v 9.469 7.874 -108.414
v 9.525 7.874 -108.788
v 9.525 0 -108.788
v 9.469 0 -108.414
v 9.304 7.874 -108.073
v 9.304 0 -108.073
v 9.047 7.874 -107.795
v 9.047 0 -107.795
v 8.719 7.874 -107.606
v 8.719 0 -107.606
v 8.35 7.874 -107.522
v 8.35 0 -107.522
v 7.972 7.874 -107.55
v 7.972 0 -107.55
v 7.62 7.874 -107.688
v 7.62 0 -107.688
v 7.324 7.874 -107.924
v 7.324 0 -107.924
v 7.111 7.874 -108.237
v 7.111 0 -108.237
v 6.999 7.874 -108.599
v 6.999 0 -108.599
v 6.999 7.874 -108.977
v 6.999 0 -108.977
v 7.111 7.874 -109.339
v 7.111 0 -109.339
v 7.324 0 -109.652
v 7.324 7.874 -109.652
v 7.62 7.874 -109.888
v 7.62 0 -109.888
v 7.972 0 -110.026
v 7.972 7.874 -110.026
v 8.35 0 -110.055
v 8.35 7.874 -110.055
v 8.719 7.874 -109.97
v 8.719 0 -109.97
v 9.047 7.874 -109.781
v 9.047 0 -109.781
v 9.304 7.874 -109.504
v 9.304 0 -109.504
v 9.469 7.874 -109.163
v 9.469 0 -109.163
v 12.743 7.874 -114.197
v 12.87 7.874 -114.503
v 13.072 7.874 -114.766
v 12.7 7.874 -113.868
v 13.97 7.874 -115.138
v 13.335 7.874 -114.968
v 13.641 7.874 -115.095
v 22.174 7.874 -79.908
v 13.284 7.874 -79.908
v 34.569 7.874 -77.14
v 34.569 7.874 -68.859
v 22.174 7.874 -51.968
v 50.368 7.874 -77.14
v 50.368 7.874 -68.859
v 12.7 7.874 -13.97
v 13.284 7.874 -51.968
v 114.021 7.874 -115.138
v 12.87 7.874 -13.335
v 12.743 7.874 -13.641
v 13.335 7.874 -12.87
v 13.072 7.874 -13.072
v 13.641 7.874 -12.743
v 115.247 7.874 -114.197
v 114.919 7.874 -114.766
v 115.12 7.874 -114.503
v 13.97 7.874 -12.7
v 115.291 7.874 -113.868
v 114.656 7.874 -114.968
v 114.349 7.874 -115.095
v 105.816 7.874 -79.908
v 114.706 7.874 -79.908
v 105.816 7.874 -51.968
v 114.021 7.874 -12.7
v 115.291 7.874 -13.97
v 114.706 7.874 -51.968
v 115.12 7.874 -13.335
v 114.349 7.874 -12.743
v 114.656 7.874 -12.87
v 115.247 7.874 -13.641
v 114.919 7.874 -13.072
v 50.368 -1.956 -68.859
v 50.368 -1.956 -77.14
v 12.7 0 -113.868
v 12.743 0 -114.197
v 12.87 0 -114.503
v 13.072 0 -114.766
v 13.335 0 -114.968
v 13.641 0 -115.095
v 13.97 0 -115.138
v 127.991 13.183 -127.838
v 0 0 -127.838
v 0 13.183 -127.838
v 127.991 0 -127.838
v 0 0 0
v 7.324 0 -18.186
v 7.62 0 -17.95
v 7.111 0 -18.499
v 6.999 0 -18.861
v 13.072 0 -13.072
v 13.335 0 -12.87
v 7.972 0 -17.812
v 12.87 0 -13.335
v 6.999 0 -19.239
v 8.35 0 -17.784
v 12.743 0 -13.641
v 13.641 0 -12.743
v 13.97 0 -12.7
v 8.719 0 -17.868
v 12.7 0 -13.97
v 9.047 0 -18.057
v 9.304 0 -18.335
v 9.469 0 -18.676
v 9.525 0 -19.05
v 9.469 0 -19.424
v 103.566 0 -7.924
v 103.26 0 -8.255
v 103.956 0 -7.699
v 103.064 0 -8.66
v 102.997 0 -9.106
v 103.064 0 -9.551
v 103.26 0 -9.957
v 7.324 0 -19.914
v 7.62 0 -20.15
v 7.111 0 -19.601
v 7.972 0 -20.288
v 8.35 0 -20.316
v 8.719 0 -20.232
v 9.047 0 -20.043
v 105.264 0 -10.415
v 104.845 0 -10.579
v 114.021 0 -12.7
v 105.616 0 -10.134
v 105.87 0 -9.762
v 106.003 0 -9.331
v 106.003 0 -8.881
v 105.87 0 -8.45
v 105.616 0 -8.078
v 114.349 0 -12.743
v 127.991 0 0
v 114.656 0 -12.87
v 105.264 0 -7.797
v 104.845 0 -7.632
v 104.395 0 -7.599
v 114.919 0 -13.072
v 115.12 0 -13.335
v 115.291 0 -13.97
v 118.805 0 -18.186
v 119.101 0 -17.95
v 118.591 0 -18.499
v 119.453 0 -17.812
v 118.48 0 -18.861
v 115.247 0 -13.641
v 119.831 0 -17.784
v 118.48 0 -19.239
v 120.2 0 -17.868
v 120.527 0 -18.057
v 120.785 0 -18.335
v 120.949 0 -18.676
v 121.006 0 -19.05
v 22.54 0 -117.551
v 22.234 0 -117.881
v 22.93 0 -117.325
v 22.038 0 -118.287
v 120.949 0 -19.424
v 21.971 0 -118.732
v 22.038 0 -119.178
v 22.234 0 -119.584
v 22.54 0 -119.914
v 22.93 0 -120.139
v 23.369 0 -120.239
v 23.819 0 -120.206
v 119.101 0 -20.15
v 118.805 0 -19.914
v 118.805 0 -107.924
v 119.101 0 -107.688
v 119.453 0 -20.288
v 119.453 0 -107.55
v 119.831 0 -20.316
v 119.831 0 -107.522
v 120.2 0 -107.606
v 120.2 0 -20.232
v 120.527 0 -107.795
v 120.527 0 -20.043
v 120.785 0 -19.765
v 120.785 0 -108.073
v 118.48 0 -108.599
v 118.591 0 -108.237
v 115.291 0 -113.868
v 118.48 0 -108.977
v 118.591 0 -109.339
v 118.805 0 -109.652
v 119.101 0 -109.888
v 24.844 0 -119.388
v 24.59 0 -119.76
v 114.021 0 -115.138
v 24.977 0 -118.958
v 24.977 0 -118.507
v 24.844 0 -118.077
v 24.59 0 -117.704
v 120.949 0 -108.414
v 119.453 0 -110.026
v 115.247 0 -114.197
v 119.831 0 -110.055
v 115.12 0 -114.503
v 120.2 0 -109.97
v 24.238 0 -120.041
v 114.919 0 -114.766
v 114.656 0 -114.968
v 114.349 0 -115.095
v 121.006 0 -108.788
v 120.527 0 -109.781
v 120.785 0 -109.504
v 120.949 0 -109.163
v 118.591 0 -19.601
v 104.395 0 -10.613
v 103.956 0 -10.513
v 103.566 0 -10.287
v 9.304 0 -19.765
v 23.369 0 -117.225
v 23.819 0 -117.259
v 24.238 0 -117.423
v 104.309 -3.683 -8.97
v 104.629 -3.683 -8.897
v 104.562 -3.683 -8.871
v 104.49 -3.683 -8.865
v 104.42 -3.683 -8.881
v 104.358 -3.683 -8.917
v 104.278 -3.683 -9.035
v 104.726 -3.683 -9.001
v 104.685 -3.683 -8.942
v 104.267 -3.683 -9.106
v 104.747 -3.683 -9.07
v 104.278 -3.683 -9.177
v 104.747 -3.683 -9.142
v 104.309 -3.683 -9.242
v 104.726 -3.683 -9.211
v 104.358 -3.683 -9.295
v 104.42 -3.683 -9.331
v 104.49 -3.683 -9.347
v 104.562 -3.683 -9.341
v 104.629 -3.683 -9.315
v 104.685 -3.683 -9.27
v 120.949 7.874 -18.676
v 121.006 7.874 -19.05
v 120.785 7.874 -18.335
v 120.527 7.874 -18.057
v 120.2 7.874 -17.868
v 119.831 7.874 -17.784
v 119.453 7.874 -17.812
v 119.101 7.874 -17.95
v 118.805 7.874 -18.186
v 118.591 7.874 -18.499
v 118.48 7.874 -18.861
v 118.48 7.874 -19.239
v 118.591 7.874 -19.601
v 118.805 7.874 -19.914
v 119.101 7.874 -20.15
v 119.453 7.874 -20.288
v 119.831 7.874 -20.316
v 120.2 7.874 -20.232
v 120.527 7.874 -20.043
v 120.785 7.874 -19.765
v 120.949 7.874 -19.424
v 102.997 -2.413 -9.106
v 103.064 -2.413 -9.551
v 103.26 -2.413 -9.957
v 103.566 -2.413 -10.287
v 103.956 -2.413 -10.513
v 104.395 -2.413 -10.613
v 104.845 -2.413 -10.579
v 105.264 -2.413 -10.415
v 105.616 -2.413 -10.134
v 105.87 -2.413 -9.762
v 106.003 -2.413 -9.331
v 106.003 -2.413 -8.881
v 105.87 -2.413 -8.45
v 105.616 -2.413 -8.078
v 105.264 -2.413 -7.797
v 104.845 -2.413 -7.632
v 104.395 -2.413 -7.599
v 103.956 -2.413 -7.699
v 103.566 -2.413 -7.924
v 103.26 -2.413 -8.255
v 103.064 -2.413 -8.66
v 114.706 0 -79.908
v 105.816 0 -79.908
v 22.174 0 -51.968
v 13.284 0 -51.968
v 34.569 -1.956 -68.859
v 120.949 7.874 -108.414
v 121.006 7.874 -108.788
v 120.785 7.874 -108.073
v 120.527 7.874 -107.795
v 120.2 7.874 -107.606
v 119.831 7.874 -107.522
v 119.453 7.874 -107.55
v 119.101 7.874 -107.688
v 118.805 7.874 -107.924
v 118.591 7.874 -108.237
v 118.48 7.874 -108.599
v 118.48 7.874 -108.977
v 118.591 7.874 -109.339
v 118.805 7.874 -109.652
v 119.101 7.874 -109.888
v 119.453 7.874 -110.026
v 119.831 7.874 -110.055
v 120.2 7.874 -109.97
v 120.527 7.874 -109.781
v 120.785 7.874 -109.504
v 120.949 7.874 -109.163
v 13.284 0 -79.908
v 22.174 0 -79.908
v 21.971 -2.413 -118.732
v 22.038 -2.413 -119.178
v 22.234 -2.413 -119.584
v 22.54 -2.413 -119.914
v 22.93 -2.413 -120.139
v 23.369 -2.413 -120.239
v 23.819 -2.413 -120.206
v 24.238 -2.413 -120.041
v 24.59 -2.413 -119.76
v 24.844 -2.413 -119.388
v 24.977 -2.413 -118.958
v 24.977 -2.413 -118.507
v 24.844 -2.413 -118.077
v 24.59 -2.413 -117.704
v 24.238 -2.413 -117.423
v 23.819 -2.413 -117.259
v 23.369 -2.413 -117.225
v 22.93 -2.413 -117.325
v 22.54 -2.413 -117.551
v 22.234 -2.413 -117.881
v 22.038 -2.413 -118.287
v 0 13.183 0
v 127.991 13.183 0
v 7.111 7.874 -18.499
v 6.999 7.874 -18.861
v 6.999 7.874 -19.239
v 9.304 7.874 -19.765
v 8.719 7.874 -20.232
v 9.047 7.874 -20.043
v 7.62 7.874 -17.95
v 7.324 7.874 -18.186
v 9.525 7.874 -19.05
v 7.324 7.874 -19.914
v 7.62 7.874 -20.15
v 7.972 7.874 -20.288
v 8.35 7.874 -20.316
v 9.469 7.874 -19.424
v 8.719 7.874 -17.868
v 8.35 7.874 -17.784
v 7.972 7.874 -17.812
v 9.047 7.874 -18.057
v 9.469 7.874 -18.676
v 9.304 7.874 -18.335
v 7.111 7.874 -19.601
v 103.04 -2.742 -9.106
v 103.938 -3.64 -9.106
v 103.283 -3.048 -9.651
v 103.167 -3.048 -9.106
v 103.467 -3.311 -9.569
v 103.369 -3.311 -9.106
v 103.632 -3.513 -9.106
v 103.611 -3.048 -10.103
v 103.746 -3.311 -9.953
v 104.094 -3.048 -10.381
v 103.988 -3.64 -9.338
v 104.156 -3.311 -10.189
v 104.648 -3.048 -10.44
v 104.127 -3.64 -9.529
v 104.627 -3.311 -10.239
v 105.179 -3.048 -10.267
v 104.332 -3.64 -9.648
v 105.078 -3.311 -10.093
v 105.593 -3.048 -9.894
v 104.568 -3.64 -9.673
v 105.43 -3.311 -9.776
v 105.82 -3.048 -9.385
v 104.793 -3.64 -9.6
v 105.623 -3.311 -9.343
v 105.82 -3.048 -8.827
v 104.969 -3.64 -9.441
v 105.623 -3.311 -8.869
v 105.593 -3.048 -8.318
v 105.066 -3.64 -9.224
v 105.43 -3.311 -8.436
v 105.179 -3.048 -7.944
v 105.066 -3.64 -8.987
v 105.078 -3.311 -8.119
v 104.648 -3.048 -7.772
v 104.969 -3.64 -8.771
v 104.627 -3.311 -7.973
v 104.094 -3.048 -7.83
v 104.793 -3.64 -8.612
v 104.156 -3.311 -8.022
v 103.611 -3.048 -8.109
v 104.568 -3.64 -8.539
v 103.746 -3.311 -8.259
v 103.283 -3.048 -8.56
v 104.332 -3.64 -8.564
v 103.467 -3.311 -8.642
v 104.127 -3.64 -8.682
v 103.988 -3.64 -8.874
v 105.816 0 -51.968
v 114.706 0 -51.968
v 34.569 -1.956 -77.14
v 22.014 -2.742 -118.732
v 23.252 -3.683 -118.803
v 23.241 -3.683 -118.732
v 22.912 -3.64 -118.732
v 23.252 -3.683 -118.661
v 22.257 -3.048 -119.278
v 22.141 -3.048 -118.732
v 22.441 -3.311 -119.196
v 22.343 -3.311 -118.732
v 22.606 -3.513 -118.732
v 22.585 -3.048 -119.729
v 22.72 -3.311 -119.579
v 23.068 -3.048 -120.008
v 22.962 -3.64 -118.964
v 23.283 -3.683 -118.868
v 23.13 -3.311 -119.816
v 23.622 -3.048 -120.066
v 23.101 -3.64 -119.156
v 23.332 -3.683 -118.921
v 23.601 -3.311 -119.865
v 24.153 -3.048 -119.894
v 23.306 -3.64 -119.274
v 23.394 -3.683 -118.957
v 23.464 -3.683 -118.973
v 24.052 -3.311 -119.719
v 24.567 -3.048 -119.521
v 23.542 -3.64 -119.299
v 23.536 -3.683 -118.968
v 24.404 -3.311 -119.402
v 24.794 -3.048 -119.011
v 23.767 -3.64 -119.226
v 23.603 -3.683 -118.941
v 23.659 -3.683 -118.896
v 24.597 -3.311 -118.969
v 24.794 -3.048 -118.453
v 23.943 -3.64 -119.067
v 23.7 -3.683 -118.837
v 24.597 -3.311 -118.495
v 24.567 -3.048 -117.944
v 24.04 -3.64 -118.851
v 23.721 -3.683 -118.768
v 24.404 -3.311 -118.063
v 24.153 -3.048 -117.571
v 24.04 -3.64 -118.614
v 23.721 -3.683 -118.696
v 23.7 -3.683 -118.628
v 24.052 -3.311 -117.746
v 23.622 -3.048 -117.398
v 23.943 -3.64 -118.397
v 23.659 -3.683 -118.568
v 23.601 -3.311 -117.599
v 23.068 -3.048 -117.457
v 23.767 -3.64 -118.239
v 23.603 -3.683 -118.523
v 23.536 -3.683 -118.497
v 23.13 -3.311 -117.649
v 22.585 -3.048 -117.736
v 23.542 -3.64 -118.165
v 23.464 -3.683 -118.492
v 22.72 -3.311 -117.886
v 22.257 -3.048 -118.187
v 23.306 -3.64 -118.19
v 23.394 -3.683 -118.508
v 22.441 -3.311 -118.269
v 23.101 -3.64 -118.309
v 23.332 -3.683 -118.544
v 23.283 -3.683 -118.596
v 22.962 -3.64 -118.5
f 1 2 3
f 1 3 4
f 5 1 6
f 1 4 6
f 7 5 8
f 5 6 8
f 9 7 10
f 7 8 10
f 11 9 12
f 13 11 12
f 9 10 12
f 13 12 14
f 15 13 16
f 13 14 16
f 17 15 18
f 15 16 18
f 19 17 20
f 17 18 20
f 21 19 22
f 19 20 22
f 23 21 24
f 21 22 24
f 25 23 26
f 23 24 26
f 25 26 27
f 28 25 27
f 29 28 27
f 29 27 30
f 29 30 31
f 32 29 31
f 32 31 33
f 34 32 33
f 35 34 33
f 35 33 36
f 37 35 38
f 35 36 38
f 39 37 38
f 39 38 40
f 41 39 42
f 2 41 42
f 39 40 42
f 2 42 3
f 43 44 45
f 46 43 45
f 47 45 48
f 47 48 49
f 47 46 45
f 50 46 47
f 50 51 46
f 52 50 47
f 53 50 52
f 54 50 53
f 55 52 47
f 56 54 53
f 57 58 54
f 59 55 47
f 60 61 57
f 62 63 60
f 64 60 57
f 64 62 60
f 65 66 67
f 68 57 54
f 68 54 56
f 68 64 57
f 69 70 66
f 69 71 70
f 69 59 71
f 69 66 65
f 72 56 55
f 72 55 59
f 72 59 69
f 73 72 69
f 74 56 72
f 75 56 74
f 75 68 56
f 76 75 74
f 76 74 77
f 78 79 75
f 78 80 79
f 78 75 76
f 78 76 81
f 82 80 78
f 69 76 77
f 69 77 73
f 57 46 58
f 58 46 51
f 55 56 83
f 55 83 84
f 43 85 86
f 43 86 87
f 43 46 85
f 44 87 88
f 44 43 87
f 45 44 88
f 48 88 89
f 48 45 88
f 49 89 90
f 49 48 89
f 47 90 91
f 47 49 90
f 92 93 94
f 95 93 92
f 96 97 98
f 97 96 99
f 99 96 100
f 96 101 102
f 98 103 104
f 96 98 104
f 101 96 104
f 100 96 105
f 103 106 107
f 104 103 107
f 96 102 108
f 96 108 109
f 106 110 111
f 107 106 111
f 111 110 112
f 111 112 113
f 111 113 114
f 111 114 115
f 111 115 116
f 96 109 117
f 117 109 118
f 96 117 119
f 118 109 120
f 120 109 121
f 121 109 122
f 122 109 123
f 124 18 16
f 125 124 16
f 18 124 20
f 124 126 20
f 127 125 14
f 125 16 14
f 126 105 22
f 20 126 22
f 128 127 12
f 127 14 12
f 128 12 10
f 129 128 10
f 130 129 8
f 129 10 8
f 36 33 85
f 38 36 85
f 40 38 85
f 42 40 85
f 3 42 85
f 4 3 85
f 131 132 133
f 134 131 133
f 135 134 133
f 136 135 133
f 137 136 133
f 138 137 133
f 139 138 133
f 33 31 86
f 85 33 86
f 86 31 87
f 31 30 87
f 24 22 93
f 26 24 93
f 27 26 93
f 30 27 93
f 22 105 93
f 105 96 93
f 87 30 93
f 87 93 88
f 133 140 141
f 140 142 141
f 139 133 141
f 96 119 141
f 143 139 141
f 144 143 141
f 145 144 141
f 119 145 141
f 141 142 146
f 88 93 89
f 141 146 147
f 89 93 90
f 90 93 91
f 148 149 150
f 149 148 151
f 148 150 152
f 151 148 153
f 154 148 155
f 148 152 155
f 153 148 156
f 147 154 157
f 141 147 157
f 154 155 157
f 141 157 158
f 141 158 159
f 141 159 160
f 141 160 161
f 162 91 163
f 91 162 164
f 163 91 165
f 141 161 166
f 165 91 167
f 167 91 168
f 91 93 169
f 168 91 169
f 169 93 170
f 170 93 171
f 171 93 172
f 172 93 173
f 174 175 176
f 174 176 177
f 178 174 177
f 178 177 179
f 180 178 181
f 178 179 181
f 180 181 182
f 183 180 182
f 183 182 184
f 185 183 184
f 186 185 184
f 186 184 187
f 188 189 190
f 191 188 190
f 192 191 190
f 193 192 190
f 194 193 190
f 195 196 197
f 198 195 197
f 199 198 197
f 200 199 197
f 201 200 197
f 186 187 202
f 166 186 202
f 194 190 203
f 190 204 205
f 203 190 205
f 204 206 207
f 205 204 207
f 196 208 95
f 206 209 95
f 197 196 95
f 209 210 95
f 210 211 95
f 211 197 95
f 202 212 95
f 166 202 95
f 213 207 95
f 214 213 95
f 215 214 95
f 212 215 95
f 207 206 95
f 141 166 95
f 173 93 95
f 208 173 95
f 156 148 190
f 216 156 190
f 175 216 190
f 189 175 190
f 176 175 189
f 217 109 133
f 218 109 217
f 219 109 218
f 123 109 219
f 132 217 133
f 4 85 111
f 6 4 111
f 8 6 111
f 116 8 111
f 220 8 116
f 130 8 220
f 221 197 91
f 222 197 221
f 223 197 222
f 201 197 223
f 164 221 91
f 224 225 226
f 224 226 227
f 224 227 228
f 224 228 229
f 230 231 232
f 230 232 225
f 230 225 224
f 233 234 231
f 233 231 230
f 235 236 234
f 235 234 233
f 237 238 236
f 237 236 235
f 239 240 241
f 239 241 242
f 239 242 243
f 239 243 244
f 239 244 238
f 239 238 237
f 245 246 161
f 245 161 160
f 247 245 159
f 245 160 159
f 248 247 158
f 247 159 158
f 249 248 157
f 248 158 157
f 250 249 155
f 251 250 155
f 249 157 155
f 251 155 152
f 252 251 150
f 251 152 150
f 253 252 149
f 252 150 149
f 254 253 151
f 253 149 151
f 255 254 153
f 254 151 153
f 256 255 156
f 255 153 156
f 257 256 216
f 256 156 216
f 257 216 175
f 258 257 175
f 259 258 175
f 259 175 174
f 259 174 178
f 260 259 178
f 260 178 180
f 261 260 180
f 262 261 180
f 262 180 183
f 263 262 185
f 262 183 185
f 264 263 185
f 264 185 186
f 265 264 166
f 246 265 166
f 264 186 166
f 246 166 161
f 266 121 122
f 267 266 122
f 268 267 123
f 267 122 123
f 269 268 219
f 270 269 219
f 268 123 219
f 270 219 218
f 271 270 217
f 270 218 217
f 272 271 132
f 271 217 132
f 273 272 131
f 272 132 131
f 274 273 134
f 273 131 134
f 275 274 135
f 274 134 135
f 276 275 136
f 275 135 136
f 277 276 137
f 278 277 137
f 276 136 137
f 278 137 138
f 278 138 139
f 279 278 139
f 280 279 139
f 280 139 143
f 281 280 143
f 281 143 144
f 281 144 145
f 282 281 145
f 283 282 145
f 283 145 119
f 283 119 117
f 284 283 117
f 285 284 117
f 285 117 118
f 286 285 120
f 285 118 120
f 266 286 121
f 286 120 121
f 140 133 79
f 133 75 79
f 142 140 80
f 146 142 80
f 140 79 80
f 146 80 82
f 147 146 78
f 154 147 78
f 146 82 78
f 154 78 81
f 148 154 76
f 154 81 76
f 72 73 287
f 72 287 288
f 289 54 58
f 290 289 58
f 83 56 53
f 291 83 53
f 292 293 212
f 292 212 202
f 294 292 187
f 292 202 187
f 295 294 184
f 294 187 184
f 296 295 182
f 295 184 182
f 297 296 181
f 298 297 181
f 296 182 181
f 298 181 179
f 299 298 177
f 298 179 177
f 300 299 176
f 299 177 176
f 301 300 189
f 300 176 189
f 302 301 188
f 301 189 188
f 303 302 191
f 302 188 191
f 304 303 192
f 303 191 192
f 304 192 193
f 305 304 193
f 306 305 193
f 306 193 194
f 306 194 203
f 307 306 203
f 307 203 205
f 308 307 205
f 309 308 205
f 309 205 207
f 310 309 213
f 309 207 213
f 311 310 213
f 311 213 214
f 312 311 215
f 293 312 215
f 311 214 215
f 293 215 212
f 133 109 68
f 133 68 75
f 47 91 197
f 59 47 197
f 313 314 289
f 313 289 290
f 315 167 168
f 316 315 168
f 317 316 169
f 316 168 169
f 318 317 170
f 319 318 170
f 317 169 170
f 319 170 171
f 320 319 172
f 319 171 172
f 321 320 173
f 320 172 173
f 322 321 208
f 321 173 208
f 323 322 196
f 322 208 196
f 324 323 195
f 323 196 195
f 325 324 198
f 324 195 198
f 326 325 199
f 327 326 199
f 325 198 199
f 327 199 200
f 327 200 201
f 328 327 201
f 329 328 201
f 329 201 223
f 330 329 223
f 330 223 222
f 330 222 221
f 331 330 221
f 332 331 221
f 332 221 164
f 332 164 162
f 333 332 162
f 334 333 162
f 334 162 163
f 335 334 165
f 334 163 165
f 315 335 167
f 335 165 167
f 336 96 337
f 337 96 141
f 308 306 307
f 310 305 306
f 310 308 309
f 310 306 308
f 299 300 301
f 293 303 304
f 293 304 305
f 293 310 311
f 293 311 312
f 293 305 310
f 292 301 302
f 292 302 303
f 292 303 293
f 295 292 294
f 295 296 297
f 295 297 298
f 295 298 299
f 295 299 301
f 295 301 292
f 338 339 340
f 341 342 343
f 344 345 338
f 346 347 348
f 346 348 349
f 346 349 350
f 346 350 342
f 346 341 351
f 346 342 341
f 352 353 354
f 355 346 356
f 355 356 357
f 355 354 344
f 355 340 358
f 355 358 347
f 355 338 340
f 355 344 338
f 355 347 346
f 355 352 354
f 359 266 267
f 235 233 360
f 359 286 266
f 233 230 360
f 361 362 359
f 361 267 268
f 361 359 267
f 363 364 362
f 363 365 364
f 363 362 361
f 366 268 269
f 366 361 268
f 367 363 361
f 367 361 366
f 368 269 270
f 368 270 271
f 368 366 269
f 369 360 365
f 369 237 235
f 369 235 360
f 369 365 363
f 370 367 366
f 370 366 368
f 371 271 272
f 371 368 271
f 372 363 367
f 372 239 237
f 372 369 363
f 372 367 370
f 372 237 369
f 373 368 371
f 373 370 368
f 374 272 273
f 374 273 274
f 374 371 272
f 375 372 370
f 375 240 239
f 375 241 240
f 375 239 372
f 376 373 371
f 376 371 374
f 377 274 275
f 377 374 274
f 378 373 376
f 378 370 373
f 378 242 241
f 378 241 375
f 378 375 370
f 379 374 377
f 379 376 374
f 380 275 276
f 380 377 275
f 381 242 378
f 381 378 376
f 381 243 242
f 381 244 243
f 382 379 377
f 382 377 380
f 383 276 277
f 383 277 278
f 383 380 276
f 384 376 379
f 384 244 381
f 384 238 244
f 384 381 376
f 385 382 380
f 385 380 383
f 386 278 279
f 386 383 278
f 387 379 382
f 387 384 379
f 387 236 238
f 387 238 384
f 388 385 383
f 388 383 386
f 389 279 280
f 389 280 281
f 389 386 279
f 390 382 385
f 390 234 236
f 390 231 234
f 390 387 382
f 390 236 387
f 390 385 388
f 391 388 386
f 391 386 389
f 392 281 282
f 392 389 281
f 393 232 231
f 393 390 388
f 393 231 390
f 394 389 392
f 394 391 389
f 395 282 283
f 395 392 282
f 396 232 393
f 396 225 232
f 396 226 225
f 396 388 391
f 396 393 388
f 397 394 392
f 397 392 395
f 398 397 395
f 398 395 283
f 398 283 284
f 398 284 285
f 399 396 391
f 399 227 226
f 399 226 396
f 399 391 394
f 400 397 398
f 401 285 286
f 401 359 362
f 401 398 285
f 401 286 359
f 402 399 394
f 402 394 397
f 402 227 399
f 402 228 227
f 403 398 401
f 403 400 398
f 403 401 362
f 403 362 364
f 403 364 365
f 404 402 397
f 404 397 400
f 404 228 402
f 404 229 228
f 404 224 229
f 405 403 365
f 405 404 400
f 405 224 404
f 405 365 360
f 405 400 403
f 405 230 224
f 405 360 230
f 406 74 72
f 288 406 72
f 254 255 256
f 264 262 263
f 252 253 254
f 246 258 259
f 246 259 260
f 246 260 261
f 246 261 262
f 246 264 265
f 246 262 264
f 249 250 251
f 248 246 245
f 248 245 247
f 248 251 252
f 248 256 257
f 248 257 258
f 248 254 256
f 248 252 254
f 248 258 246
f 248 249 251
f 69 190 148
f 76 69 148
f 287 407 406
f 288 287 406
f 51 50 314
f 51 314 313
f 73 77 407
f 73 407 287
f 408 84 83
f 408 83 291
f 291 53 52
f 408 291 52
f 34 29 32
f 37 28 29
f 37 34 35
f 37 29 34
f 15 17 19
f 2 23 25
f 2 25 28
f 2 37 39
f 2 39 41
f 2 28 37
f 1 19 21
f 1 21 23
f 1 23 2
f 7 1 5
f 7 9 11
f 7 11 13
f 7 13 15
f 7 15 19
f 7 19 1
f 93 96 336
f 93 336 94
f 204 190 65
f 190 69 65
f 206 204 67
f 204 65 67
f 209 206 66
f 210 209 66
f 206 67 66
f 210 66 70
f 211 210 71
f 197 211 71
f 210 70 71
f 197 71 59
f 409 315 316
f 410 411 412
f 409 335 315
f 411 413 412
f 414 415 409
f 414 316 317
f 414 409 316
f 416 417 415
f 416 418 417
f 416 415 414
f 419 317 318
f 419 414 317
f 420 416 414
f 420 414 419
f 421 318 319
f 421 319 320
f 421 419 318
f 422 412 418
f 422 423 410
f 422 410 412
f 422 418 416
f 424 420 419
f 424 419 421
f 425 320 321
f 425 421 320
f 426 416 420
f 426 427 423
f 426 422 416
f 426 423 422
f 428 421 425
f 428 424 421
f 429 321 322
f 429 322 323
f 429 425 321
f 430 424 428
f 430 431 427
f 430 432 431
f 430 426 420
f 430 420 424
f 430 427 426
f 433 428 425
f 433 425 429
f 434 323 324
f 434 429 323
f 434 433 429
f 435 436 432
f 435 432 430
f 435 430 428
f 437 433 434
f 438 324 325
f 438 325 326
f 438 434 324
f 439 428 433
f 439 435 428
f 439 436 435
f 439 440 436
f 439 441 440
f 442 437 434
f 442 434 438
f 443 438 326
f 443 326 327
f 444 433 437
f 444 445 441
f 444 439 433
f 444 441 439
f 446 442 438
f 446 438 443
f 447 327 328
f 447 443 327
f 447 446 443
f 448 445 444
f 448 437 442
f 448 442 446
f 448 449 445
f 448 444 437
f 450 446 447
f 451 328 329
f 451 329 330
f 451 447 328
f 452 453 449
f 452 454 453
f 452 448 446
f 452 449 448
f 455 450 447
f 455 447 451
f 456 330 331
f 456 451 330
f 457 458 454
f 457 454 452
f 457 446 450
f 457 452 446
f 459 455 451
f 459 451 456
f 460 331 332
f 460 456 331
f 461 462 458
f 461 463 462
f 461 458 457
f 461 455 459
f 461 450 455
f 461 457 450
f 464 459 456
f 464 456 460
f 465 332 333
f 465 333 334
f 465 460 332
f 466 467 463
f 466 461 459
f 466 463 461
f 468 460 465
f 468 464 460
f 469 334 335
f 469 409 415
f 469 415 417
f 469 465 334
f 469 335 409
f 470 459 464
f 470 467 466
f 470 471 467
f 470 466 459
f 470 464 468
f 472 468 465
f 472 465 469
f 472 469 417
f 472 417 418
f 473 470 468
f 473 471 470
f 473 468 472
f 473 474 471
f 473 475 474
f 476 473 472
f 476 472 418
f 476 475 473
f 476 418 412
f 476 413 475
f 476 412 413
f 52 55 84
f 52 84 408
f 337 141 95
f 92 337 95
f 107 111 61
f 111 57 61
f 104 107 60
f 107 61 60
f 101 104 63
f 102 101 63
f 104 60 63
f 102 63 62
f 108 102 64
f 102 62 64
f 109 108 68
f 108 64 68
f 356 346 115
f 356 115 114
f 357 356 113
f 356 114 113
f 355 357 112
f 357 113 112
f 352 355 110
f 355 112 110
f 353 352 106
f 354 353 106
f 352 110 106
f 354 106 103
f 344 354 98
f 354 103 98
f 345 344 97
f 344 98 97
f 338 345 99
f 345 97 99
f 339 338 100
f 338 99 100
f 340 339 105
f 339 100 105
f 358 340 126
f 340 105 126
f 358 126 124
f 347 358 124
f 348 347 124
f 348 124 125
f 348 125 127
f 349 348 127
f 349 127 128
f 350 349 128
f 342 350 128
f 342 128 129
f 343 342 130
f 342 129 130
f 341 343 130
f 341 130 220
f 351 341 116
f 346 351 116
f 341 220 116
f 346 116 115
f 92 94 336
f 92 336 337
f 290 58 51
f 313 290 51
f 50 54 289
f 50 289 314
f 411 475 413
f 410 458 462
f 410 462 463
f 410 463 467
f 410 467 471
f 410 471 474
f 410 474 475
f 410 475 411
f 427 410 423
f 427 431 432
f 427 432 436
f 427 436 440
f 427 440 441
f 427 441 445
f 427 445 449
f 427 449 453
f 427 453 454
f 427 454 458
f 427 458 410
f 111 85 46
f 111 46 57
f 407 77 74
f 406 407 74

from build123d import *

# Parameters (mm, degrees)
SKETCH1_W           = 127.9906
SKETCH1_H           = 127.8382
BOSS_EXTRUDE1_DEPTH = 13.1826
SKETCH2_W           = 102.5906
SKETCH2_H           = 102.4382
CUT_EXTRUDE1_DEPTH  = 7.874
SKETCH3_R           = 1.27
CUT_EXTRUDE2_DEPTH  = 7.874
SKETCH4_W           = 15.7988
SKETCH4_H           = 8.2804
BOSS_EXTRUDE2_DEPTH = 9.8298
SKETCH5_W           = 8.89
SKETCH5_H           = 27.94
BOSS_EXTRUDE3_DEPTH = 7.874
SKETCH6_R           = 1.5113
BOSS_EXTRUDE4_DEPTH = 3.683
FILLET3_R           = 1.27
FILLET4_R           = 1.27
FILLET5_R           = 1.27
FILLET6_R           = 1.27
FILLET8_R           = 1.27
FILLET9_R           = 1.27


with BuildPart() as part:
    # Sketch1 → Boss-Extrude1 (new body)
    with BuildSketch(Plane(origin=(0, 0, 0), x_dir=(1, 0, 0), z_dir=(0, 1, 0))):
        with Locations((63.9953, 63.9191)):
            Rectangle(SKETCH1_W, SKETCH1_H)
    extrude(amount=BOSS_EXTRUDE1_DEPTH)

    # Sketch2 → Cut-Extrude1 (cut)
    with BuildSketch(Plane.XZ):
        with Locations((63.9953, -63.9191)):
            Rectangle(SKETCH2_W, SKETCH2_H)
    extrude(amount=-CUT_EXTRUDE1_DEPTH, mode=Mode.SUBTRACT)

    # Sketch3 → Cut-Extrude2 (cut)
    with BuildSketch(Plane.XZ):
        with Locations((8.255, -108.7882)):
            Circle(SKETCH3_R)
        with Locations((8.255, -19.05)):
            Circle(SKETCH3_R)
        with Locations((119.7356, -108.7882)):
            Circle(SKETCH3_R)
        with Locations((119.7356, -19.05)):
            Circle(SKETCH3_R)
    extrude(amount=-CUT_EXTRUDE2_DEPTH, mode=Mode.SUBTRACT)

    # Sketch4 → Boss-Extrude2 (add)
    with BuildSketch(Plane(origin=(0, 7.874, 0), x_dir=(-1, 0, 0), z_dir=(0, -1, 0))):
        with Locations((-42.4688, 72.9996)):
            Rectangle(SKETCH4_W, SKETCH4_H)
    extrude(amount=BOSS_EXTRUDE2_DEPTH)

    # Sketch5 → Boss-Extrude3 (add)
    with BuildSketch(Plane(origin=(0, 7.874, 0), x_dir=(-1, 0, 0), z_dir=(0, -1, 0))):
        with Locations((-17.7292, 65.9384)):
            Rectangle(SKETCH5_W, SKETCH5_H)
        with Locations((-110.2614, 65.9384)):
            Rectangle(SKETCH5_W, SKETCH5_H)
    extrude(amount=BOSS_EXTRUDE3_DEPTH)

    # Sketch6 → Boss-Extrude4 (add)
    with BuildSketch(Plane(origin=(0, 0, 0), x_dir=(-1, 0, 0), z_dir=(0, -1, 0))):
        with Locations((-23.4823, 118.7323)):
            Circle(SKETCH6_R)
        with Locations((-104.5083, 9.1059)):
            Circle(SKETCH6_R)
    extrude(amount=BOSS_EXTRUDE4_DEPTH)

    # Fillet3
    fillet3_edges = [part.edges().sort_by_distance(p)[0] for p in [
        (12.7, 3.937, -115.1382),
    ]]
    fillet(fillet3_edges, radius=FILLET3_R)

    # Fillet4
    fillet4_edges = [part.edges().sort_by_distance(p)[0] for p in [
        (12.7, 3.937, -12.7),
    ]]
    fillet(fillet4_edges, radius=FILLET4_R)

    # Fillet5
    fillet5_edges = [part.edges().sort_by_distance(p)[0] for p in [
        (115.2906, 3.937, -12.7),
    ]]
    fillet(fillet5_edges, radius=FILLET5_R)

    # Fillet6
    fillet6_edges = [part.edges().sort_by_distance(p)[0] for p in [
        (115.2906, 3.937, -115.1382),
    ]]
    fillet(fillet6_edges, radius=FILLET6_R)

    # Fillet8
    fillet8_edges = [part.edges().sort_by_distance(p)[0] for p in [
        (24.9936, -3.683, -118.7323),
    ]]
    fillet(fillet8_edges, radius=FILLET8_R)

    # Fillet9
    fillet9_edges = [part.edges().sort_by_distance(p)[0] for p in [
        (106.0196, -3.683, -9.1059),
    ]]
    fillet(fillet9_edges, radius=FILLET9_R)


solid = part.part
